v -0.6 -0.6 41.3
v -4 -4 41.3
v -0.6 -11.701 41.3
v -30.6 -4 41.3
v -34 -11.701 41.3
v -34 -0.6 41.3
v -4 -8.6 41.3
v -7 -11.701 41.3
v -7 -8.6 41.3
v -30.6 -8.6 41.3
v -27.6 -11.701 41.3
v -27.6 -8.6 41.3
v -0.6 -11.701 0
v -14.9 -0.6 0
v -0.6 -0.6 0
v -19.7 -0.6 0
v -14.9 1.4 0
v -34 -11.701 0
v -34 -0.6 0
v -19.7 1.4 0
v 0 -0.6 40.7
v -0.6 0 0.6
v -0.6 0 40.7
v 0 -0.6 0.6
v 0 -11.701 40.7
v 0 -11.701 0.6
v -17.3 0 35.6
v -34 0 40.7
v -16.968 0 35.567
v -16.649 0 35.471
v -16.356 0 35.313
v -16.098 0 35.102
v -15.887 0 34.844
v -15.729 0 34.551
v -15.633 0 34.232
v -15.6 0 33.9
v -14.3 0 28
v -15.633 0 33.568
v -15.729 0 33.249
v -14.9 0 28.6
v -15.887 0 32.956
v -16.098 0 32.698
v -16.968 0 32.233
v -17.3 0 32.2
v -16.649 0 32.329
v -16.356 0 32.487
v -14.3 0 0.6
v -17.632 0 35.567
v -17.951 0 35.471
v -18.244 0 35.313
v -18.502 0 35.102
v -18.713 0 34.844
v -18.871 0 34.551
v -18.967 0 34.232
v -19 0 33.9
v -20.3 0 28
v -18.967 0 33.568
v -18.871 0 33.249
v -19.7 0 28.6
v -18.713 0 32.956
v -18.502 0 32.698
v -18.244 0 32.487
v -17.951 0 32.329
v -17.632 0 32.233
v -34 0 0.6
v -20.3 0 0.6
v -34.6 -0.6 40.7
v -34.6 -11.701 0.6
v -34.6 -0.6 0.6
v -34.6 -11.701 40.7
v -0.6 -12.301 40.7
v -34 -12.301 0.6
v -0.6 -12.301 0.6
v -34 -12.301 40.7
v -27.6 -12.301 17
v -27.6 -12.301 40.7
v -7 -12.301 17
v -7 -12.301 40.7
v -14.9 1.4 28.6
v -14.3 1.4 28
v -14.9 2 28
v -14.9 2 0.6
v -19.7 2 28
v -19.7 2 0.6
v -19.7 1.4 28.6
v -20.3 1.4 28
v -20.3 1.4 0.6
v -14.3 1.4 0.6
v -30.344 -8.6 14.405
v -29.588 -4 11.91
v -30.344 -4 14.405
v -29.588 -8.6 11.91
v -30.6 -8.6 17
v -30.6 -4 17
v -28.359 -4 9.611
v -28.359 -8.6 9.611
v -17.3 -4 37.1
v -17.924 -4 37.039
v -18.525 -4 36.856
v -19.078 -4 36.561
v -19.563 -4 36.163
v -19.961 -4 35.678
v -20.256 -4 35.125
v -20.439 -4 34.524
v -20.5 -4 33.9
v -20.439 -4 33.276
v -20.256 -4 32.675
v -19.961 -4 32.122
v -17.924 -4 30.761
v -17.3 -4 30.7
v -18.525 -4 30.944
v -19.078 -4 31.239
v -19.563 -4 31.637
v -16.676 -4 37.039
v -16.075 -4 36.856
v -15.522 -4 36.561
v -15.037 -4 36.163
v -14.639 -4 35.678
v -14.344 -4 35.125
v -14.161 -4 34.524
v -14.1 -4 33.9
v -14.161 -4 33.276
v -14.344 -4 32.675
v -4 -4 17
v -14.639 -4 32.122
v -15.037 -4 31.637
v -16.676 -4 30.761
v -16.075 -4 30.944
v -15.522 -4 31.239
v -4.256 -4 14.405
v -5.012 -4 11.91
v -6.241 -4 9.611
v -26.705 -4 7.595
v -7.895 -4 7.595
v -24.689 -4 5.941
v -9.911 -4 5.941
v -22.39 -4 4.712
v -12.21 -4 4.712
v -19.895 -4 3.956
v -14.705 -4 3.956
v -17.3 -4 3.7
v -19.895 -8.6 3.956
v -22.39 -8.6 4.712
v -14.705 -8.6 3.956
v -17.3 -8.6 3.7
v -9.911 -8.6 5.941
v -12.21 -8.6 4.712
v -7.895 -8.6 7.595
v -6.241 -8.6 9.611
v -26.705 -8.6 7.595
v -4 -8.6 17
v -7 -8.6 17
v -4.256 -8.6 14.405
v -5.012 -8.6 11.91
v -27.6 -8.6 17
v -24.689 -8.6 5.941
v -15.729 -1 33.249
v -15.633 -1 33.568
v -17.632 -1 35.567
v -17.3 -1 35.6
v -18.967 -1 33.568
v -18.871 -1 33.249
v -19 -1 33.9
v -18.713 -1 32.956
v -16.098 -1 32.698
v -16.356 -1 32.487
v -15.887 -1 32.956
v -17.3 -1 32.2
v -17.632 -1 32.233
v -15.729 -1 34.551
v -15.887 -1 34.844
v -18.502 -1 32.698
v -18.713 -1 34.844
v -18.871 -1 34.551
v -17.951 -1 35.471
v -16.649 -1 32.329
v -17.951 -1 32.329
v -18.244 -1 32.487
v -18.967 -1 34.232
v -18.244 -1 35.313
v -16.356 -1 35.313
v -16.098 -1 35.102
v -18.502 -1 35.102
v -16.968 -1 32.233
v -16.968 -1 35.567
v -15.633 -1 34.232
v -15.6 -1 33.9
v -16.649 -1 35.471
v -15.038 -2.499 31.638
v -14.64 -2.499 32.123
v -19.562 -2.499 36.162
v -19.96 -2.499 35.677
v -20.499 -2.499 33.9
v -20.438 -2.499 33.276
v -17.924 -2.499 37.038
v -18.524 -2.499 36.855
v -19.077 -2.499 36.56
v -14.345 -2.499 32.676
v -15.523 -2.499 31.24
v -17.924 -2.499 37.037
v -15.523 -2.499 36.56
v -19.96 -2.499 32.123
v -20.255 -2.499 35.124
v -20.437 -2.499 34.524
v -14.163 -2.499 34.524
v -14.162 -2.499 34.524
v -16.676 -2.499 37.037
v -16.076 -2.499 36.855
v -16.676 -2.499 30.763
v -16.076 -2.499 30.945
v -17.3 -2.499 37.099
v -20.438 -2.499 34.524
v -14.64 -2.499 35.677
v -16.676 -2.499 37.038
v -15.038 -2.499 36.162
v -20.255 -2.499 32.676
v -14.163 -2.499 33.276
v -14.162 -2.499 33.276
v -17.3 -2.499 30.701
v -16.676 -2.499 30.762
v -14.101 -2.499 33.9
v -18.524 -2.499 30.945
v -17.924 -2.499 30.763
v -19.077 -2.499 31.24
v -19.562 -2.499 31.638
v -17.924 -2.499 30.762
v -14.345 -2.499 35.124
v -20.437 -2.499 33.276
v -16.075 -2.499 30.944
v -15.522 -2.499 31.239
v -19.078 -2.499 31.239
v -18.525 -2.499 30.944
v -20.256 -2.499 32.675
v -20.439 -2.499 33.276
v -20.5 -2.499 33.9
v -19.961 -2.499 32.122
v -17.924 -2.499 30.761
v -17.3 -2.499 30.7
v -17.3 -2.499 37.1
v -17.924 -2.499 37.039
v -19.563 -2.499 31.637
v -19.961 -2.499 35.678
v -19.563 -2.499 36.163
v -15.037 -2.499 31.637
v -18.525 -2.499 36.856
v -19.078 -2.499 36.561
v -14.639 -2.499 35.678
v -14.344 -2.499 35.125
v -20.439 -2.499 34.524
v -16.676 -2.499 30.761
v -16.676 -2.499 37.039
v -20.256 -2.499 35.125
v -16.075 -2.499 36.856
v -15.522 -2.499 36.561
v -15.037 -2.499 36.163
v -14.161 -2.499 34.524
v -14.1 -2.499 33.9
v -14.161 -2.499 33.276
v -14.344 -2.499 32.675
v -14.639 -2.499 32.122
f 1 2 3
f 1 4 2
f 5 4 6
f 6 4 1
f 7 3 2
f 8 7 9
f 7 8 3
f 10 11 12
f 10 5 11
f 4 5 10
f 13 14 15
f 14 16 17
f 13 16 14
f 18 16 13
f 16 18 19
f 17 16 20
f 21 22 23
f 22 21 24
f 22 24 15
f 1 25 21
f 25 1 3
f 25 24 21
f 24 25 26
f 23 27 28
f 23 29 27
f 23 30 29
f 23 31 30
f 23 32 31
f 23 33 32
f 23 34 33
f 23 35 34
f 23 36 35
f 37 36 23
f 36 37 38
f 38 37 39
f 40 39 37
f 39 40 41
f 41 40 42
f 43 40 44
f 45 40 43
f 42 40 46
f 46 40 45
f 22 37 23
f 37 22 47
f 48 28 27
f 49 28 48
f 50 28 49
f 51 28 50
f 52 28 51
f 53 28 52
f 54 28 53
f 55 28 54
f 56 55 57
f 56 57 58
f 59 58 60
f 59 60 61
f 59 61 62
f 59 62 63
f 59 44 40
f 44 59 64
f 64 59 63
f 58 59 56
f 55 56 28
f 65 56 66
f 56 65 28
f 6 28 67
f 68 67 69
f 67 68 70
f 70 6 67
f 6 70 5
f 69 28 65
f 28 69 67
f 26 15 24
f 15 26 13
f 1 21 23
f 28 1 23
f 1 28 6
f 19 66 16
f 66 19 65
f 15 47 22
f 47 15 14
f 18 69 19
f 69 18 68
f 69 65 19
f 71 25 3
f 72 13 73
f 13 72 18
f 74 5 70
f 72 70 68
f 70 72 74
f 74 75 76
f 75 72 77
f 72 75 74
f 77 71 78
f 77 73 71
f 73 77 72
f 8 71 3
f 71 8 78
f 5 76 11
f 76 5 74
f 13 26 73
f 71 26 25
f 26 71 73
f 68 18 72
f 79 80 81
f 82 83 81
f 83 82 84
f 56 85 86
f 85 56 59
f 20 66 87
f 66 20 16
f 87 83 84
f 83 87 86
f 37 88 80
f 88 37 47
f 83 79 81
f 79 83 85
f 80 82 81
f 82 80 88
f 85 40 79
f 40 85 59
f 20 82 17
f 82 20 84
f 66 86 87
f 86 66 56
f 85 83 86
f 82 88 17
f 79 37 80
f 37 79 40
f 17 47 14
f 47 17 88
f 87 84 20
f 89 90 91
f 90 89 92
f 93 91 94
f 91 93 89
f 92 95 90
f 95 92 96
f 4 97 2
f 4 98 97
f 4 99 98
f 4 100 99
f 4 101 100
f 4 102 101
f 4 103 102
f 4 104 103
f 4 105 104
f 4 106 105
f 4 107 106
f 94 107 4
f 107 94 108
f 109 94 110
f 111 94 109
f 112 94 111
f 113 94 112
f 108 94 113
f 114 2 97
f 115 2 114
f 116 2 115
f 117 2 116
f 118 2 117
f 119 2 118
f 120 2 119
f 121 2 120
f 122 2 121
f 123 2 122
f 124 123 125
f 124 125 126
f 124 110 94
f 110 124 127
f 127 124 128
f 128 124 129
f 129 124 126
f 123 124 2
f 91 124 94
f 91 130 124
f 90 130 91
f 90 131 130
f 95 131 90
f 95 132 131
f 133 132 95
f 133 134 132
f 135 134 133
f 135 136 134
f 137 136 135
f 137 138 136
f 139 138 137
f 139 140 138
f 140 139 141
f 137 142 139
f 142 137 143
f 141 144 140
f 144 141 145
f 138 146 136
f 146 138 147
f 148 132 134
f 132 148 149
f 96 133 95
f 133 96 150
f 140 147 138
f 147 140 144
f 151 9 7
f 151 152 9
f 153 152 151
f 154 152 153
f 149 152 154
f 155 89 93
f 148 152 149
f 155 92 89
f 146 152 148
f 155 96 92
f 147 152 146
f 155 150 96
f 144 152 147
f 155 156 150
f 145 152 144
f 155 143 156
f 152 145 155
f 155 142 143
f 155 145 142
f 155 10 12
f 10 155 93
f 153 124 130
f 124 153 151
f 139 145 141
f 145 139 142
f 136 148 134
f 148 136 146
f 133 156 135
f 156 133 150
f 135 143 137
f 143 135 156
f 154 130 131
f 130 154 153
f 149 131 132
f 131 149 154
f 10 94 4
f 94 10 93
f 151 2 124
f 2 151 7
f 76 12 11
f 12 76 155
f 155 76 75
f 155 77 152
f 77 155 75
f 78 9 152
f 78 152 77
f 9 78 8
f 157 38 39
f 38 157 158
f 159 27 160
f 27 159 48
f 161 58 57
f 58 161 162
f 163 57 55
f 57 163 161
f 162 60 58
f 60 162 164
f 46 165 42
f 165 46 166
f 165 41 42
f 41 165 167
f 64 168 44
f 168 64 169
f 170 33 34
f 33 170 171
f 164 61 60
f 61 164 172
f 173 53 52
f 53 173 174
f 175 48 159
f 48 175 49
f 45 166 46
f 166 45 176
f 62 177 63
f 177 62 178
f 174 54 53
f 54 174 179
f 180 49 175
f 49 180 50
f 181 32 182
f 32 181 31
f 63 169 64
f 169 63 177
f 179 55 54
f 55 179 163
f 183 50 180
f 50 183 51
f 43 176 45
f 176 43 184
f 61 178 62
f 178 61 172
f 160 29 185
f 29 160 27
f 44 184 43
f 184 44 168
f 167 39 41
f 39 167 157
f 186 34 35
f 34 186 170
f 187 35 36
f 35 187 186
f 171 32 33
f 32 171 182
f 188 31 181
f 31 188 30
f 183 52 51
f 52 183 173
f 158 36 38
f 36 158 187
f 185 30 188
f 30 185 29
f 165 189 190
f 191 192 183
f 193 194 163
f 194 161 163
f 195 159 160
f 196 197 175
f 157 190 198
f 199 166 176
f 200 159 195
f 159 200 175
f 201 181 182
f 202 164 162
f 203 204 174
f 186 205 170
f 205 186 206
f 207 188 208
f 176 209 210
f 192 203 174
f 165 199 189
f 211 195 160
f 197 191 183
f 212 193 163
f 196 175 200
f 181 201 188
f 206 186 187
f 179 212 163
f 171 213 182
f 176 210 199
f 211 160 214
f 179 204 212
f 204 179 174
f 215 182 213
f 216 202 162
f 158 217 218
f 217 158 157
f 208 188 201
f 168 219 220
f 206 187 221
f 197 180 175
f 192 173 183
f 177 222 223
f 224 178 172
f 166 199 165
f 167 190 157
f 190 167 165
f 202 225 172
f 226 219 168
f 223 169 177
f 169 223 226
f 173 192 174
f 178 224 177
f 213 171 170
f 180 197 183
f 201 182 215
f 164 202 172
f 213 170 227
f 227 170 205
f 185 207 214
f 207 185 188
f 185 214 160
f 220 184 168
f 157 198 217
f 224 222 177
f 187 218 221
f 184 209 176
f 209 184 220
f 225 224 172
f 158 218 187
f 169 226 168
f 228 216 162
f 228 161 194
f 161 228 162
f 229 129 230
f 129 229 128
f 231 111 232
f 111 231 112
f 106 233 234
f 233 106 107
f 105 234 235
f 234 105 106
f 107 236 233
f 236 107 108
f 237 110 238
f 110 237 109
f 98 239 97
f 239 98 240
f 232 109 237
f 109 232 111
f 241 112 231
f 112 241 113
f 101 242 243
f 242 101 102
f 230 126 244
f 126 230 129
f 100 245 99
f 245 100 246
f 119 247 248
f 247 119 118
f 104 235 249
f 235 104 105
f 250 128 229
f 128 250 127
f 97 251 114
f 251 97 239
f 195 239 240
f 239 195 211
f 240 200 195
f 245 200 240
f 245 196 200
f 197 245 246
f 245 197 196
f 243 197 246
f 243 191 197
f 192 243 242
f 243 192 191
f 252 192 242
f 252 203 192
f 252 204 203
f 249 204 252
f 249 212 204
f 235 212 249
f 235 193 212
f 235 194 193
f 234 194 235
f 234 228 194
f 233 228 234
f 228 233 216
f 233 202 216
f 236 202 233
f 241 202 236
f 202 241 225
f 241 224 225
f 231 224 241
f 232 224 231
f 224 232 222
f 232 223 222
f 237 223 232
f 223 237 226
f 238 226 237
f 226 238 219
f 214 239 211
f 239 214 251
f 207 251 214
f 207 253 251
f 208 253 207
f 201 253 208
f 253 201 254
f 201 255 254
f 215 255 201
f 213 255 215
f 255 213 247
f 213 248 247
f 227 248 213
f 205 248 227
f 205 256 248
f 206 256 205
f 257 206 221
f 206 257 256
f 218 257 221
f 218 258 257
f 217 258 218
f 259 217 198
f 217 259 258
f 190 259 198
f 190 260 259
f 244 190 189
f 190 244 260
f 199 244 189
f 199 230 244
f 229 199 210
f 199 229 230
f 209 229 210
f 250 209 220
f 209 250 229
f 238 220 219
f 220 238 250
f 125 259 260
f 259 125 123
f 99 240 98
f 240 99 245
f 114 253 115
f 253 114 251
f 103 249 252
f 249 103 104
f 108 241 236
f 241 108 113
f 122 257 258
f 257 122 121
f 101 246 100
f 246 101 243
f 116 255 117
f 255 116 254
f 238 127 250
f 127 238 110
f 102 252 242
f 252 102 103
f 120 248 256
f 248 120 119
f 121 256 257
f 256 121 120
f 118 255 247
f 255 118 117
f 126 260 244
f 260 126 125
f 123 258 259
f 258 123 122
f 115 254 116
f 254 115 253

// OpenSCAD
// Original - 0.4
hook_clearence=0.3;

brace_wall=4;
brace_angle=0; // [-60:60]
profile_position = "vertical"; // [vertical,horizontal]
profile_type = "2020"; // [2020,3030]
profile_stud_depth=2;
profile_clearence=0.0;
profile_nut_clearence=0.3;

screw_dia = 3;
screw_head = "flat"; // [flat,round]
// Screw head diameter, 0 for auto
screw_head_dia = 0;
// Round head screw head height, 0 for auto
round_head_screw_head_height = 0;
screw_length=8;
screw_min_wall = 2;
screw_clearence=0.2;

$chamfer=0.6;

/* [Hidden] */

// Filler holder hook measurements
hook_width=26;
hook_neck_width=20;
hook_thickness=4;
hook_height=24+26/2;
hook_wall_clearence=4;


$fn=32;

module reflect(v) {
    children();
    mirror(v)
        children();
}

module chamfered_cube(size=10,chamfer=999999,center=false)
{
    sz = size[0]?size:[size,size,size];
    chamfer = chamfer!=999999?chamfer:($chamfer?$chamfer:0);
    translate(center?[0:0:0]:sz/2) {
        hull() {
            cube([sz.x,sz.y-2*chamfer,sz.z-2*chamfer],center=true);
            cube([sz.x-2*chamfer,sz.y-2*chamfer,sz.z],center=true);
            cube([sz.x-2*chamfer,sz.y,sz.z-2*chamfer],center=true);
        }
    }
}

module screw_hole_flathead(thickness,screw_dia,cap_dia,deep)
{
    translate([0,0,-1])
        cylinder(d=screw_dia,h=thickness+2);
    translate([0,0,deep])
        cylinder(d1=screw_dia,d2=cap_dia,h=(cap_dia-screw_dia)/2);
    translate([0,0,deep+(cap_dia-screw_dia)/2-0.001])
        cylinder(d=cap_dia,h=thickness-deep-(cap_dia-screw_dia)/2+0.001+1);
}

module brace(
    profile_type=profile_type,
    brace_angle=brace_angle,
    profile_position=profile_position,
    screw_dia=screw_dia)
{
    profile_size = profile_type == "2020" ? 20 : 30;
    profile_slot_width = profile_type == "2020" ? 6 : 8;
    profile_slot_depth = profile_type == "2020" ? 6 : 9;
    // T-Nut width
    profile_nut_width = profile_type == "2020" ? 10 : 16;
    min_base_width = 20;
    min_stud_length = 3;

    // Head height of a round head screw, usually equal to the thread diameter
    _round_head_screw_head_height = round_head_screw_head_height ?
        round_head_screw_head_height :
        screw_dia;
    // Screw head diameter, usually a bit less than twice the thread diameter
    _screw_head_dia = screw_head_dia ?
        screw_head_dia :
        2 * screw_dia;
    round_head_screw_wall = max(screw_min_wall,screw_length - profile_slot_depth + 0.5);
    flat_head_screw_head_height=(_screw_head_dia-screw_dia)/2+0.5;
    flat_head_screw_wall = max(screw_min_wall+flat_head_screw_head_height/2,flat_head_screw_head_height,screw_length-profile_slot_depth+0.5);
    back_wall = screw_head=="round" ?
        max(brace_wall,_round_head_screw_head_height+round_head_screw_wall) :
        max(brace_wall,flat_head_screw_wall);

    hook_wall=hook_wall_clearence-hook_clearence;
    _brace_angle=abs(brace_angle);
    vertical=profile_position=="vertical"?1:0;
    screw_vpos = vertical ?
        hook_clearence+hook_height-screw_dia-2*screw_clearence :
        brace_wall+hook_clearence+hook_height-profile_size/2;

    mirror([brace_angle<0?1:0,0,0]) rotate(180) difference() {
        xcenter=hook_width/2+hook_clearence+brace_wall;
        xtrans=2*xcenter*(1-cos(_brace_angle));
        basewidth=brace_angle==0 ?
            hook_width+2*hook_clearence+2*brace_wall :
            vertical ?
                min_base_width :
                max(profile_nut_width+2*min_stud_length,min_base_width);

        union() {
            translate([xtrans,back_wall-brace_wall,0])
                rotate(_brace_angle)
                    chamfered_cube([hook_width+2*hook_clearence+2*brace_wall,brace_wall+2*hook_clearence+hook_thickness+hook_wall,brace_wall+hook_clearence+hook_height]);
            hull() {
                translate([xtrans,back_wall-brace_wall,0])
                    rotate(_brace_angle)
                        chamfered_cube([hook_width+2*hook_clearence+2*brace_wall,2*$chamfer+0.001,brace_wall+hook_clearence+hook_height]);
                translate([xcenter-basewidth/2,0,0])
                    chamfered_cube([basewidth,2*$chamfer+0.001,brace_wall+hook_clearence+hook_height]);
            }
            hull() {
                translate([xtrans,back_wall-brace_wall,0])
                    rotate(_brace_angle)
                        translate([0,brace_wall+2*hook_clearence+hook_thickness+hook_wall-2*$chamfer,0])
                            chamfered_cube([hook_width+2*hook_clearence+2*brace_wall,2*$chamfer+0.001,brace_wall+hook_clearence+hook_height]);
                translate([xcenter-basewidth/2,0,0])
                    chamfered_cube([basewidth,2*$chamfer+0.001,brace_wall+hook_clearence+hook_height]);
            }

            // Profile studs
            if (vertical) {
                profile_stud_height=screw_vpos-profile_nut_width/2-profile_nut_clearence;
                translate([xcenter-profile_slot_width/2+profile_clearence,-profile_stud_depth,0])
                    chamfered_cube([profile_slot_width-2*profile_clearence,profile_stud_depth+2*$chamfer,profile_stud_height]);
            } else {
                translate([xcenter,0,0])
                    reflect([1,0,0])
                        translate([-basewidth/2,-profile_stud_depth,screw_vpos-(profile_slot_width-2*profile_clearence)/2])
                            chamfered_cube([(basewidth-profile_nut_width)/2-profile_nut_clearence,profile_stud_depth+2*$chamfer,profile_slot_width-2*profile_clearence]);
            }
        }

        translate([xtrans,back_wall-brace_wall,0]) {
            rotate(_brace_angle) {
                translate([brace_wall,brace_wall,brace_wall]) {
                    translate([hook_width/2+hook_clearence,0,hook_width/2])
                        rotate([-90,0,0])
                            cylinder(d=hook_width+2*hook_clearence,h=hook_thickness+2*hook_clearence);
                    translate([0,0,hook_width/2])
                        cube([hook_width+2*hook_clearence,hook_thickness+2*hook_clearence,hook_height-hook_width/2+1]);
                }

                translate([brace_wall+(hook_width-hook_neck_width)/2,brace_wall+2*hook_clearence+hook_thickness-1,brace_wall+hook_width/2])
                    cube([hook_neck_width+2*hook_clearence,hook_wall+2,hook_height-hook_width/2+hook_clearence+1]);
            }
        }

        // Screw hole
        if (screw_head == "round") {
            translate([xcenter,0,screw_vpos]) {
                rotate([-90,0,0]) {
                    translate([0,0,-1])
                        cylinder(d=screw_dia+2*screw_clearence,h=(back_wall+hook_thickness+2*hook_clearence+hook_wall)*cos(_brace_angle)+(2*brace_wall+hook_width+2*hook_clearence)*sin(_brace_angle)+1);
                    translate([0,0,round_head_screw_wall])
                        cylinder(d=_screw_head_dia+2*screw_clearence,h=(back_wall+hook_thickness+2*hook_clearence+hook_wall)*cos(_brace_angle)+(2*brace_wall+hook_width+2*hook_clearence)*sin(_brace_angle)-round_head_screw_wall);
                }
            }
        } else {
            translate([xcenter,0,screw_vpos])
                rotate([-90,0,0])
                    screw_hole_flathead((back_wall+hook_thickness+2*hook_clearence+hook_wall)*cos(_brace_angle)+(2*brace_wall+hook_width+2*hook_clearence)*sin(_brace_angle)+1,screw_dia+2*screw_clearence,_screw_head_dia+2*screw_clearence,flat_head_screw_wall-flat_head_screw_head_height/*3-screw_dia/2-screw_clearence*/);
        }
    }
}

brace();
